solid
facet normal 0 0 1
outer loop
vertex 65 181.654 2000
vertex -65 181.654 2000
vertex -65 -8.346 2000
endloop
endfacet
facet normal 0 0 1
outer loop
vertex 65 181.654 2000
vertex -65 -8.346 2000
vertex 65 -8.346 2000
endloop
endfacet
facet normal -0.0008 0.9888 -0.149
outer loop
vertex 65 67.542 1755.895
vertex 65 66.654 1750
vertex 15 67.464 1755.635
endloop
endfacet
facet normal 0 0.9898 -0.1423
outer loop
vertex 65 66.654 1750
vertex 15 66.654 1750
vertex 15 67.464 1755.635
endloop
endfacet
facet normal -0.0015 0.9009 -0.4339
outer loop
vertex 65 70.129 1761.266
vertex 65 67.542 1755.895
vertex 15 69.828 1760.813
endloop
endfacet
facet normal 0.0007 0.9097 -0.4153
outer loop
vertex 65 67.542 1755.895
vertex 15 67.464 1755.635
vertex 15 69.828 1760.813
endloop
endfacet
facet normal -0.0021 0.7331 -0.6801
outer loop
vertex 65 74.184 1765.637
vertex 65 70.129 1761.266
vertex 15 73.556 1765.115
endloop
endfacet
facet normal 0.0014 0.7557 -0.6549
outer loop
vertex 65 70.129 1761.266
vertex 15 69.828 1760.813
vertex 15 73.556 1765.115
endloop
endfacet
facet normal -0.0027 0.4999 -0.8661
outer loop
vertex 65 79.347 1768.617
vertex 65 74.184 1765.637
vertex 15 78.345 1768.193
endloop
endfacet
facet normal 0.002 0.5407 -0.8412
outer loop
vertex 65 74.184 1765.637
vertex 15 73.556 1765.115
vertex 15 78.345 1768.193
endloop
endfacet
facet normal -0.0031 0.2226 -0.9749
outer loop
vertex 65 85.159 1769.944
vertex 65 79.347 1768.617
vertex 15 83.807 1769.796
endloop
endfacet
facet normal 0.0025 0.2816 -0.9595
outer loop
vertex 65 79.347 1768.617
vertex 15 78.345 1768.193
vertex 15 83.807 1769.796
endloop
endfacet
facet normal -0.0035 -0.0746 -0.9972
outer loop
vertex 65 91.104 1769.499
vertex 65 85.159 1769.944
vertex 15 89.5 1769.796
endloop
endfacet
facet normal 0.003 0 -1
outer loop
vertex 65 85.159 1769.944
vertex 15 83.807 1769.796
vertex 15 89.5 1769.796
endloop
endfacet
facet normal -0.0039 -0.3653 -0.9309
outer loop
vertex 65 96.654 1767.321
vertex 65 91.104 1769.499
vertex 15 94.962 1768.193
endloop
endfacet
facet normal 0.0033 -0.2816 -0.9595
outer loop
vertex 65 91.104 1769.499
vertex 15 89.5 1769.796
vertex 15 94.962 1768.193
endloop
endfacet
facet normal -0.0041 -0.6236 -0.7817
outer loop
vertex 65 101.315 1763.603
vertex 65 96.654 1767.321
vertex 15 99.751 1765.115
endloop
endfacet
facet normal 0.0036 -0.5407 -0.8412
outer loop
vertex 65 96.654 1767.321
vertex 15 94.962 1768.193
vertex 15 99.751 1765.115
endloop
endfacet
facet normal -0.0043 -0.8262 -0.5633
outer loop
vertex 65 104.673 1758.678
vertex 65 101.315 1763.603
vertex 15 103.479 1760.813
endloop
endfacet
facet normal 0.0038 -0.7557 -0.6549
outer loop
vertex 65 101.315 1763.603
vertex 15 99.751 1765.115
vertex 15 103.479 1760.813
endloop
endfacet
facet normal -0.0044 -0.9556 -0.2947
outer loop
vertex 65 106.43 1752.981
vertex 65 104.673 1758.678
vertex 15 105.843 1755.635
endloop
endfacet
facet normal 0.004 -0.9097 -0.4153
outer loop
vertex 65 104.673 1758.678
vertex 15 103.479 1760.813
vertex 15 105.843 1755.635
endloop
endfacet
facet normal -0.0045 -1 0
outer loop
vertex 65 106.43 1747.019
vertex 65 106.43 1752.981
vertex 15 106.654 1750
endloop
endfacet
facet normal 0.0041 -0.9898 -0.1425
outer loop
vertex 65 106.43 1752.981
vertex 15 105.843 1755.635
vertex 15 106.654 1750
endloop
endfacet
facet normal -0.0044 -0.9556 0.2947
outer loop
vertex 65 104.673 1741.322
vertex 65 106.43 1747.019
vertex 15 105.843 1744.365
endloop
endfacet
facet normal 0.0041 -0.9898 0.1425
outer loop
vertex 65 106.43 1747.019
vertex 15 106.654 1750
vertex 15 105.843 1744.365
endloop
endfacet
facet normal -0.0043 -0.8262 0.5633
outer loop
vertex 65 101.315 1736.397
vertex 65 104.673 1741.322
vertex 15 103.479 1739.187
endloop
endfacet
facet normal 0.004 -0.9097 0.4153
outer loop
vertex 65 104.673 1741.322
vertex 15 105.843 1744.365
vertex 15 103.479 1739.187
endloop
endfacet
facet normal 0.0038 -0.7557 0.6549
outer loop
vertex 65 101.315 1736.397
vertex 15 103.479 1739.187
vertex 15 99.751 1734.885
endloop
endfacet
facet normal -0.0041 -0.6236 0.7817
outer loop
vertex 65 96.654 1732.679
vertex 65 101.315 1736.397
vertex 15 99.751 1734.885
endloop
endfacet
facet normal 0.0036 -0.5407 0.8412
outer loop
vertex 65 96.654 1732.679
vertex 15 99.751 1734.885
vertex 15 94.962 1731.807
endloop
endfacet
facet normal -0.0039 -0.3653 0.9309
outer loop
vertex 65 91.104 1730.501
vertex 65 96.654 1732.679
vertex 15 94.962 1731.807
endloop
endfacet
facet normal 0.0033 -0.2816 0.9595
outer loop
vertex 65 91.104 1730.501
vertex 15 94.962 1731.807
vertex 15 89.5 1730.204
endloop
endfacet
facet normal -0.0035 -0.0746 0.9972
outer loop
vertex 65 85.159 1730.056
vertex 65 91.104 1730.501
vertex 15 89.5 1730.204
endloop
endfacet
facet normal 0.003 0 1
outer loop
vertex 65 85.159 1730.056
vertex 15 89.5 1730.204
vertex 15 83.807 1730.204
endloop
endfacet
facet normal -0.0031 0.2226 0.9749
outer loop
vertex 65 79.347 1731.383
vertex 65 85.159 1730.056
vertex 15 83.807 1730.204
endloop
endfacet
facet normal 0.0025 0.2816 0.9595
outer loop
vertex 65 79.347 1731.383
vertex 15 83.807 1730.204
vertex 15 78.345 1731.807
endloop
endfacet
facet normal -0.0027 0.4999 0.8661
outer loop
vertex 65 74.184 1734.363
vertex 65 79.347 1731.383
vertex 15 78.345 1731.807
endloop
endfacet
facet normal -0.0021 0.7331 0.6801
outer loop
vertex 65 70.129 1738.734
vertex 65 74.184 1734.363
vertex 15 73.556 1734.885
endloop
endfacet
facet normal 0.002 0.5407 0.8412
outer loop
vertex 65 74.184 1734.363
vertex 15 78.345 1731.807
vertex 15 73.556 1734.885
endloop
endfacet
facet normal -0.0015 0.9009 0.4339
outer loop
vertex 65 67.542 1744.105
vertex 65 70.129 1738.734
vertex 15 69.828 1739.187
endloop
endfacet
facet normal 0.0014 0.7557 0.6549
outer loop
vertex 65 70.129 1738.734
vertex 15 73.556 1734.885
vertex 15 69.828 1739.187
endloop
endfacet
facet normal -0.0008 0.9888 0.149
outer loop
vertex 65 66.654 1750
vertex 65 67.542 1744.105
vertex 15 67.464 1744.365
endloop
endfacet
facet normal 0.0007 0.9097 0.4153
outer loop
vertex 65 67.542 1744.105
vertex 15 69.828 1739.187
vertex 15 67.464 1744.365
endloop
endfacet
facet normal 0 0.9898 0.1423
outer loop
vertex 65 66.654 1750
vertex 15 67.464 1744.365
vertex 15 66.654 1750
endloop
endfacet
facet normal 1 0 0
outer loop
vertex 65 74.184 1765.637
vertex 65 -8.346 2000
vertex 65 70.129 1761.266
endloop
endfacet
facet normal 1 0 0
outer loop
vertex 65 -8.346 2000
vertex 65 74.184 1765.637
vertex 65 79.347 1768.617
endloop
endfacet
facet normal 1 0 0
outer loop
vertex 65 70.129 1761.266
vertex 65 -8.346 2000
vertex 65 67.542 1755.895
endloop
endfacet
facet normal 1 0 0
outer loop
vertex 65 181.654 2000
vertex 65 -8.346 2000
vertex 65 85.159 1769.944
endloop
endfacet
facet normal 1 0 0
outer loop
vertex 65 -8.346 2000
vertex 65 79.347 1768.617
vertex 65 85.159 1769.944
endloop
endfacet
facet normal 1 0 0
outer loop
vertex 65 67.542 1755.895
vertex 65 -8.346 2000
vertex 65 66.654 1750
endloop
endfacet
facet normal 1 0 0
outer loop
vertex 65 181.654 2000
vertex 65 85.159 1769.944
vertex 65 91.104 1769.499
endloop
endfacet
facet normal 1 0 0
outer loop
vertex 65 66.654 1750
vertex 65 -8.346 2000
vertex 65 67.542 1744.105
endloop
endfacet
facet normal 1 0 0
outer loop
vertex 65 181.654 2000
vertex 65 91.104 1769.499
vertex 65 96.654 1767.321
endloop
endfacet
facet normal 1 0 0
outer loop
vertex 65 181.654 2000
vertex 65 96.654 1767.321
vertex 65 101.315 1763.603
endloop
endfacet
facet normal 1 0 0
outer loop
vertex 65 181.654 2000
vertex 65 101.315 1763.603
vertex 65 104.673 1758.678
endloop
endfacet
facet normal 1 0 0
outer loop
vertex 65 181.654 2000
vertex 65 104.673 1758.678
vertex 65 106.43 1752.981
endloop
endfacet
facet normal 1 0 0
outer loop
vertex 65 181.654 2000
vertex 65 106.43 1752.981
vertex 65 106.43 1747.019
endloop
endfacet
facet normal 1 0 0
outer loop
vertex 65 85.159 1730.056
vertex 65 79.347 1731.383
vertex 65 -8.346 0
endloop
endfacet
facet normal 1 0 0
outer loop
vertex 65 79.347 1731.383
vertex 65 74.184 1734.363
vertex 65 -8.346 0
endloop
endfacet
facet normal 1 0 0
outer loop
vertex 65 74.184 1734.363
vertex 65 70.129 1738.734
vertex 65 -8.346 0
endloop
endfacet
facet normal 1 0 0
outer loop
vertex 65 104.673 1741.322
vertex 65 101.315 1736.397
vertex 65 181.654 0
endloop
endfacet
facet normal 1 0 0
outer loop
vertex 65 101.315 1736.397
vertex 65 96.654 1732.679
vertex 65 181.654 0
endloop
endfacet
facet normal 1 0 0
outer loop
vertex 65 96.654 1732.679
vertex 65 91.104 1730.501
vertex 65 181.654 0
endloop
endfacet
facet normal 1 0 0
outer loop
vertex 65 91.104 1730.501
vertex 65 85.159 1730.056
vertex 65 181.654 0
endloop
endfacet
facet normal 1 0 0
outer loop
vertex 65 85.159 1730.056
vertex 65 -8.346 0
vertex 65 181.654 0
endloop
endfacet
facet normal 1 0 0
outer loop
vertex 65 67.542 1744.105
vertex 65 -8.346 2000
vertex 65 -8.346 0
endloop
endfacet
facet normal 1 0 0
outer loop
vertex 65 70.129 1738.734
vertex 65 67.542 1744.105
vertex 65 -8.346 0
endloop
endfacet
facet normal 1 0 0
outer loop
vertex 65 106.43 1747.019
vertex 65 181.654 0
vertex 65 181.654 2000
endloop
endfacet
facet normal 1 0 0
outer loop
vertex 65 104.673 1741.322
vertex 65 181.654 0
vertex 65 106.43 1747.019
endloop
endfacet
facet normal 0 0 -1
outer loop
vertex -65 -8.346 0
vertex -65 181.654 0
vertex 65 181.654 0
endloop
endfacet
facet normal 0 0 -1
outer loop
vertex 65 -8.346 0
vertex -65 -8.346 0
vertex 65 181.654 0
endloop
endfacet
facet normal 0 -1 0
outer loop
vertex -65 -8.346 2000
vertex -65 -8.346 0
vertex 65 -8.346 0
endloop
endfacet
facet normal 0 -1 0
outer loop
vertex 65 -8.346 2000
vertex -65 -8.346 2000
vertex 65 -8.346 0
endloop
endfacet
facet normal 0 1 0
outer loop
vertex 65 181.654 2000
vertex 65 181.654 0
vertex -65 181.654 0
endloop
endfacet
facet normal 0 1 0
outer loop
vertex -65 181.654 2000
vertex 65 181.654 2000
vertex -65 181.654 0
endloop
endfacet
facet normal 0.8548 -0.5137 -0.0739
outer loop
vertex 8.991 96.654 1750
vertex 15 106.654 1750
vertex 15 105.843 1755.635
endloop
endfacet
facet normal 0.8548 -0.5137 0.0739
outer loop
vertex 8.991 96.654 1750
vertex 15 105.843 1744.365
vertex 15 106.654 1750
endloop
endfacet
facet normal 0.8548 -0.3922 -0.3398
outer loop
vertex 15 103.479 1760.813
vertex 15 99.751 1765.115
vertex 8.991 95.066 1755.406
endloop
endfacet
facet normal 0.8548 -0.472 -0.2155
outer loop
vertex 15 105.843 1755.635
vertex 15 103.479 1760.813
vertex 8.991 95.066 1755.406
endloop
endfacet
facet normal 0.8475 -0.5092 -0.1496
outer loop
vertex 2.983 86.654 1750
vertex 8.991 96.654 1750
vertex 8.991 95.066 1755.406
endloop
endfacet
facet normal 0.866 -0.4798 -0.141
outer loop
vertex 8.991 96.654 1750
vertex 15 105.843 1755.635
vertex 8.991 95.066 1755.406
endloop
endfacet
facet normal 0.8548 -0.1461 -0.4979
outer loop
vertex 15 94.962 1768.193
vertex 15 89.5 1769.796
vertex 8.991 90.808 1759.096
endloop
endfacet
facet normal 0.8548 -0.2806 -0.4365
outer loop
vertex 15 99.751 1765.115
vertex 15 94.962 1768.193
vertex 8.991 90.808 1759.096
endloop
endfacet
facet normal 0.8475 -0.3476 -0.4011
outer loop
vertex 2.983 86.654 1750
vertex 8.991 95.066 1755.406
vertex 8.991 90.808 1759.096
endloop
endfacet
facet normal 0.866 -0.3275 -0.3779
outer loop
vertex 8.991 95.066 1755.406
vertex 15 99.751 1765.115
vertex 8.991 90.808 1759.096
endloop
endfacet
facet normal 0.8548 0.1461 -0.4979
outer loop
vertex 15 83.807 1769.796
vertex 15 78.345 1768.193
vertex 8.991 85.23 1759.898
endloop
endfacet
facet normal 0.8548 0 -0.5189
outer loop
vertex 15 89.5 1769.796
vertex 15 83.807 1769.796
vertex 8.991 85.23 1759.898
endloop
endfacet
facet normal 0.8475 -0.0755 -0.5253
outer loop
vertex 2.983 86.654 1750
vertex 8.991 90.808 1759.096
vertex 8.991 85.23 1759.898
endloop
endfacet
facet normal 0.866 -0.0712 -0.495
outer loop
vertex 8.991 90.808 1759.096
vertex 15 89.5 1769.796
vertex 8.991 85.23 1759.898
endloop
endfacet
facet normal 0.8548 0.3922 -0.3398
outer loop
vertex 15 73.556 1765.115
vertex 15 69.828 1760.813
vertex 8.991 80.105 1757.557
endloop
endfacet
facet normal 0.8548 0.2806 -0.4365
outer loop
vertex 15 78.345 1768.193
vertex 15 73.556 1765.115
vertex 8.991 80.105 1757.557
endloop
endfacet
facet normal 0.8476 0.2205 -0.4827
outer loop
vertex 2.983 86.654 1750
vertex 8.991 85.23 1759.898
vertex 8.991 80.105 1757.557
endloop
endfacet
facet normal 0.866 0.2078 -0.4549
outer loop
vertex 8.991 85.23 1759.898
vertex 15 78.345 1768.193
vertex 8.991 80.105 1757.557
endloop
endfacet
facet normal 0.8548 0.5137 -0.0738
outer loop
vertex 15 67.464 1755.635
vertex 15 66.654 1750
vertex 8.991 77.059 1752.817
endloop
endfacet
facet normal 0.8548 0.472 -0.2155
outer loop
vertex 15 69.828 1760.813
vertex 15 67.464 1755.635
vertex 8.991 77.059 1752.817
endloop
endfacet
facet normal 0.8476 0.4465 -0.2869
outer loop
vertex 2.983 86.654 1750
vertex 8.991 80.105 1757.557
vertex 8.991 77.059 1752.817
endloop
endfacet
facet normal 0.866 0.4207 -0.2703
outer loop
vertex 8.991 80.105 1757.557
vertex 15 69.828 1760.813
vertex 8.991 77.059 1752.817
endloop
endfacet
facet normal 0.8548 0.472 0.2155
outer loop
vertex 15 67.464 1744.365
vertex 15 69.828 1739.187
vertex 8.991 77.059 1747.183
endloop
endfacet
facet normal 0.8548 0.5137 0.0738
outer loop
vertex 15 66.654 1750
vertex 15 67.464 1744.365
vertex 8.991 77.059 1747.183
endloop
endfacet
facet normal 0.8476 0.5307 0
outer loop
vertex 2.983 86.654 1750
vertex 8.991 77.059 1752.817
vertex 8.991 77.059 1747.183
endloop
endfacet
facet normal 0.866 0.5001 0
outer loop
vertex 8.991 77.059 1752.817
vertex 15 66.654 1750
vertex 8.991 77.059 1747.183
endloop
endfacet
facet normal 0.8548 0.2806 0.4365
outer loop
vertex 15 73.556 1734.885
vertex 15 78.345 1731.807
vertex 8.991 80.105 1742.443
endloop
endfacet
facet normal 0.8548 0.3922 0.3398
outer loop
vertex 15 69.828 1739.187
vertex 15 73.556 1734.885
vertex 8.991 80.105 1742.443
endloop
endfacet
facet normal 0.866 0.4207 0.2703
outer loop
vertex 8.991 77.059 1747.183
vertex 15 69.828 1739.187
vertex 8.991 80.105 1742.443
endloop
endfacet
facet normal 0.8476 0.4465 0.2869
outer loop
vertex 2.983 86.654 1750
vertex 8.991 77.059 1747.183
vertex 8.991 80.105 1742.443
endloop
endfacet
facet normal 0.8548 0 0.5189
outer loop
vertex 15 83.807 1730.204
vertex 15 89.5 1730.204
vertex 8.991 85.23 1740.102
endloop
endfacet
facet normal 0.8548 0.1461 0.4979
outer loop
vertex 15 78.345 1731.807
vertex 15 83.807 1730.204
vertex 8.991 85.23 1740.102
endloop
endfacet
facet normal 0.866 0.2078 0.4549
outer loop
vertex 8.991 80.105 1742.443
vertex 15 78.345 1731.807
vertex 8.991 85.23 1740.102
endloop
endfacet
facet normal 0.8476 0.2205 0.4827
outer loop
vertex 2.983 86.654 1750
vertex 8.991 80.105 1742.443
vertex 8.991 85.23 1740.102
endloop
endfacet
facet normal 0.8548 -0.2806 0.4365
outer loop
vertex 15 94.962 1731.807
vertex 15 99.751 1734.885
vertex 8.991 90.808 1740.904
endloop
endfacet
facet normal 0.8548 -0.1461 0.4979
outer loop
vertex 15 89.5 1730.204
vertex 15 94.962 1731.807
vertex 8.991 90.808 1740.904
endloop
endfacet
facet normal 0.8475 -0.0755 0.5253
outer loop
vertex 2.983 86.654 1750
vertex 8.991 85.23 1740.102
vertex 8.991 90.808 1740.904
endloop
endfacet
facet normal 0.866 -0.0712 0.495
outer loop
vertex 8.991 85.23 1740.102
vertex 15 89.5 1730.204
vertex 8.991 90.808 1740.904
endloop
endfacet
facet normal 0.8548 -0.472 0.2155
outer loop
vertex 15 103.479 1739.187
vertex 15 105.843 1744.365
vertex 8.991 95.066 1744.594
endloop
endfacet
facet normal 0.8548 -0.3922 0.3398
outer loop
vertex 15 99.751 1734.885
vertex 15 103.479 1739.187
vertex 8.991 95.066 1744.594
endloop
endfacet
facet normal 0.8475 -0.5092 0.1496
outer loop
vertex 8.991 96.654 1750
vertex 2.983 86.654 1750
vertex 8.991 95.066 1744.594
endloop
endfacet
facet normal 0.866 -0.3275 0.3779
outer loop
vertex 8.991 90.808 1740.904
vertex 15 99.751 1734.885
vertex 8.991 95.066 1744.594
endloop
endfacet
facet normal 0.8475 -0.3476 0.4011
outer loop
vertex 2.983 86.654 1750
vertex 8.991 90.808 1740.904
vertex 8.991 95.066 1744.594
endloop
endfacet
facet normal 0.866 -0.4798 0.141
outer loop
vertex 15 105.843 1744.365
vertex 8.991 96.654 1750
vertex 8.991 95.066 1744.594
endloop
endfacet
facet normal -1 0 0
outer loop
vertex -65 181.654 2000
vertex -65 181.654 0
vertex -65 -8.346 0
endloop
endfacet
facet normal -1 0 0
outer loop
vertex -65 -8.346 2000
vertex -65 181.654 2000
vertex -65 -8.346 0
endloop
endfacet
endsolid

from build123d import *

# Parameters (mm, degrees)
F1_DEPTH = 2000
F3_D     = 40
F3_DEPTH = 50
F3_TIP   = 12.0172123806


with BuildPart() as f1:
    # F0 (on Top) → F1 (new body)
    with BuildSketch(Plane.XY):
        Polygon((-34.2555230263, 181.6535690603), (-65, 181.6535690603), (-65, -8.3464309397), (65, -8.3464309397), (65, 181.6535690603), (34.2555230263, 181.6535690603), align=None)
    extrude(amount=F1_DEPTH)

    # F3
    with Locations(Plane.YZ.offset(65)):
        with Locations((86.6535690603, 1750)):
            Hole(F3_D / 2, depth=F3_DEPTH)
            with Locations((0, 0, -(F3_DEPTH + F3_TIP / 2))):  # 118° drill point
                Cone(0, F3_D / 2, F3_TIP, mode=Mode.SUBTRACT)


solid = f1.part
